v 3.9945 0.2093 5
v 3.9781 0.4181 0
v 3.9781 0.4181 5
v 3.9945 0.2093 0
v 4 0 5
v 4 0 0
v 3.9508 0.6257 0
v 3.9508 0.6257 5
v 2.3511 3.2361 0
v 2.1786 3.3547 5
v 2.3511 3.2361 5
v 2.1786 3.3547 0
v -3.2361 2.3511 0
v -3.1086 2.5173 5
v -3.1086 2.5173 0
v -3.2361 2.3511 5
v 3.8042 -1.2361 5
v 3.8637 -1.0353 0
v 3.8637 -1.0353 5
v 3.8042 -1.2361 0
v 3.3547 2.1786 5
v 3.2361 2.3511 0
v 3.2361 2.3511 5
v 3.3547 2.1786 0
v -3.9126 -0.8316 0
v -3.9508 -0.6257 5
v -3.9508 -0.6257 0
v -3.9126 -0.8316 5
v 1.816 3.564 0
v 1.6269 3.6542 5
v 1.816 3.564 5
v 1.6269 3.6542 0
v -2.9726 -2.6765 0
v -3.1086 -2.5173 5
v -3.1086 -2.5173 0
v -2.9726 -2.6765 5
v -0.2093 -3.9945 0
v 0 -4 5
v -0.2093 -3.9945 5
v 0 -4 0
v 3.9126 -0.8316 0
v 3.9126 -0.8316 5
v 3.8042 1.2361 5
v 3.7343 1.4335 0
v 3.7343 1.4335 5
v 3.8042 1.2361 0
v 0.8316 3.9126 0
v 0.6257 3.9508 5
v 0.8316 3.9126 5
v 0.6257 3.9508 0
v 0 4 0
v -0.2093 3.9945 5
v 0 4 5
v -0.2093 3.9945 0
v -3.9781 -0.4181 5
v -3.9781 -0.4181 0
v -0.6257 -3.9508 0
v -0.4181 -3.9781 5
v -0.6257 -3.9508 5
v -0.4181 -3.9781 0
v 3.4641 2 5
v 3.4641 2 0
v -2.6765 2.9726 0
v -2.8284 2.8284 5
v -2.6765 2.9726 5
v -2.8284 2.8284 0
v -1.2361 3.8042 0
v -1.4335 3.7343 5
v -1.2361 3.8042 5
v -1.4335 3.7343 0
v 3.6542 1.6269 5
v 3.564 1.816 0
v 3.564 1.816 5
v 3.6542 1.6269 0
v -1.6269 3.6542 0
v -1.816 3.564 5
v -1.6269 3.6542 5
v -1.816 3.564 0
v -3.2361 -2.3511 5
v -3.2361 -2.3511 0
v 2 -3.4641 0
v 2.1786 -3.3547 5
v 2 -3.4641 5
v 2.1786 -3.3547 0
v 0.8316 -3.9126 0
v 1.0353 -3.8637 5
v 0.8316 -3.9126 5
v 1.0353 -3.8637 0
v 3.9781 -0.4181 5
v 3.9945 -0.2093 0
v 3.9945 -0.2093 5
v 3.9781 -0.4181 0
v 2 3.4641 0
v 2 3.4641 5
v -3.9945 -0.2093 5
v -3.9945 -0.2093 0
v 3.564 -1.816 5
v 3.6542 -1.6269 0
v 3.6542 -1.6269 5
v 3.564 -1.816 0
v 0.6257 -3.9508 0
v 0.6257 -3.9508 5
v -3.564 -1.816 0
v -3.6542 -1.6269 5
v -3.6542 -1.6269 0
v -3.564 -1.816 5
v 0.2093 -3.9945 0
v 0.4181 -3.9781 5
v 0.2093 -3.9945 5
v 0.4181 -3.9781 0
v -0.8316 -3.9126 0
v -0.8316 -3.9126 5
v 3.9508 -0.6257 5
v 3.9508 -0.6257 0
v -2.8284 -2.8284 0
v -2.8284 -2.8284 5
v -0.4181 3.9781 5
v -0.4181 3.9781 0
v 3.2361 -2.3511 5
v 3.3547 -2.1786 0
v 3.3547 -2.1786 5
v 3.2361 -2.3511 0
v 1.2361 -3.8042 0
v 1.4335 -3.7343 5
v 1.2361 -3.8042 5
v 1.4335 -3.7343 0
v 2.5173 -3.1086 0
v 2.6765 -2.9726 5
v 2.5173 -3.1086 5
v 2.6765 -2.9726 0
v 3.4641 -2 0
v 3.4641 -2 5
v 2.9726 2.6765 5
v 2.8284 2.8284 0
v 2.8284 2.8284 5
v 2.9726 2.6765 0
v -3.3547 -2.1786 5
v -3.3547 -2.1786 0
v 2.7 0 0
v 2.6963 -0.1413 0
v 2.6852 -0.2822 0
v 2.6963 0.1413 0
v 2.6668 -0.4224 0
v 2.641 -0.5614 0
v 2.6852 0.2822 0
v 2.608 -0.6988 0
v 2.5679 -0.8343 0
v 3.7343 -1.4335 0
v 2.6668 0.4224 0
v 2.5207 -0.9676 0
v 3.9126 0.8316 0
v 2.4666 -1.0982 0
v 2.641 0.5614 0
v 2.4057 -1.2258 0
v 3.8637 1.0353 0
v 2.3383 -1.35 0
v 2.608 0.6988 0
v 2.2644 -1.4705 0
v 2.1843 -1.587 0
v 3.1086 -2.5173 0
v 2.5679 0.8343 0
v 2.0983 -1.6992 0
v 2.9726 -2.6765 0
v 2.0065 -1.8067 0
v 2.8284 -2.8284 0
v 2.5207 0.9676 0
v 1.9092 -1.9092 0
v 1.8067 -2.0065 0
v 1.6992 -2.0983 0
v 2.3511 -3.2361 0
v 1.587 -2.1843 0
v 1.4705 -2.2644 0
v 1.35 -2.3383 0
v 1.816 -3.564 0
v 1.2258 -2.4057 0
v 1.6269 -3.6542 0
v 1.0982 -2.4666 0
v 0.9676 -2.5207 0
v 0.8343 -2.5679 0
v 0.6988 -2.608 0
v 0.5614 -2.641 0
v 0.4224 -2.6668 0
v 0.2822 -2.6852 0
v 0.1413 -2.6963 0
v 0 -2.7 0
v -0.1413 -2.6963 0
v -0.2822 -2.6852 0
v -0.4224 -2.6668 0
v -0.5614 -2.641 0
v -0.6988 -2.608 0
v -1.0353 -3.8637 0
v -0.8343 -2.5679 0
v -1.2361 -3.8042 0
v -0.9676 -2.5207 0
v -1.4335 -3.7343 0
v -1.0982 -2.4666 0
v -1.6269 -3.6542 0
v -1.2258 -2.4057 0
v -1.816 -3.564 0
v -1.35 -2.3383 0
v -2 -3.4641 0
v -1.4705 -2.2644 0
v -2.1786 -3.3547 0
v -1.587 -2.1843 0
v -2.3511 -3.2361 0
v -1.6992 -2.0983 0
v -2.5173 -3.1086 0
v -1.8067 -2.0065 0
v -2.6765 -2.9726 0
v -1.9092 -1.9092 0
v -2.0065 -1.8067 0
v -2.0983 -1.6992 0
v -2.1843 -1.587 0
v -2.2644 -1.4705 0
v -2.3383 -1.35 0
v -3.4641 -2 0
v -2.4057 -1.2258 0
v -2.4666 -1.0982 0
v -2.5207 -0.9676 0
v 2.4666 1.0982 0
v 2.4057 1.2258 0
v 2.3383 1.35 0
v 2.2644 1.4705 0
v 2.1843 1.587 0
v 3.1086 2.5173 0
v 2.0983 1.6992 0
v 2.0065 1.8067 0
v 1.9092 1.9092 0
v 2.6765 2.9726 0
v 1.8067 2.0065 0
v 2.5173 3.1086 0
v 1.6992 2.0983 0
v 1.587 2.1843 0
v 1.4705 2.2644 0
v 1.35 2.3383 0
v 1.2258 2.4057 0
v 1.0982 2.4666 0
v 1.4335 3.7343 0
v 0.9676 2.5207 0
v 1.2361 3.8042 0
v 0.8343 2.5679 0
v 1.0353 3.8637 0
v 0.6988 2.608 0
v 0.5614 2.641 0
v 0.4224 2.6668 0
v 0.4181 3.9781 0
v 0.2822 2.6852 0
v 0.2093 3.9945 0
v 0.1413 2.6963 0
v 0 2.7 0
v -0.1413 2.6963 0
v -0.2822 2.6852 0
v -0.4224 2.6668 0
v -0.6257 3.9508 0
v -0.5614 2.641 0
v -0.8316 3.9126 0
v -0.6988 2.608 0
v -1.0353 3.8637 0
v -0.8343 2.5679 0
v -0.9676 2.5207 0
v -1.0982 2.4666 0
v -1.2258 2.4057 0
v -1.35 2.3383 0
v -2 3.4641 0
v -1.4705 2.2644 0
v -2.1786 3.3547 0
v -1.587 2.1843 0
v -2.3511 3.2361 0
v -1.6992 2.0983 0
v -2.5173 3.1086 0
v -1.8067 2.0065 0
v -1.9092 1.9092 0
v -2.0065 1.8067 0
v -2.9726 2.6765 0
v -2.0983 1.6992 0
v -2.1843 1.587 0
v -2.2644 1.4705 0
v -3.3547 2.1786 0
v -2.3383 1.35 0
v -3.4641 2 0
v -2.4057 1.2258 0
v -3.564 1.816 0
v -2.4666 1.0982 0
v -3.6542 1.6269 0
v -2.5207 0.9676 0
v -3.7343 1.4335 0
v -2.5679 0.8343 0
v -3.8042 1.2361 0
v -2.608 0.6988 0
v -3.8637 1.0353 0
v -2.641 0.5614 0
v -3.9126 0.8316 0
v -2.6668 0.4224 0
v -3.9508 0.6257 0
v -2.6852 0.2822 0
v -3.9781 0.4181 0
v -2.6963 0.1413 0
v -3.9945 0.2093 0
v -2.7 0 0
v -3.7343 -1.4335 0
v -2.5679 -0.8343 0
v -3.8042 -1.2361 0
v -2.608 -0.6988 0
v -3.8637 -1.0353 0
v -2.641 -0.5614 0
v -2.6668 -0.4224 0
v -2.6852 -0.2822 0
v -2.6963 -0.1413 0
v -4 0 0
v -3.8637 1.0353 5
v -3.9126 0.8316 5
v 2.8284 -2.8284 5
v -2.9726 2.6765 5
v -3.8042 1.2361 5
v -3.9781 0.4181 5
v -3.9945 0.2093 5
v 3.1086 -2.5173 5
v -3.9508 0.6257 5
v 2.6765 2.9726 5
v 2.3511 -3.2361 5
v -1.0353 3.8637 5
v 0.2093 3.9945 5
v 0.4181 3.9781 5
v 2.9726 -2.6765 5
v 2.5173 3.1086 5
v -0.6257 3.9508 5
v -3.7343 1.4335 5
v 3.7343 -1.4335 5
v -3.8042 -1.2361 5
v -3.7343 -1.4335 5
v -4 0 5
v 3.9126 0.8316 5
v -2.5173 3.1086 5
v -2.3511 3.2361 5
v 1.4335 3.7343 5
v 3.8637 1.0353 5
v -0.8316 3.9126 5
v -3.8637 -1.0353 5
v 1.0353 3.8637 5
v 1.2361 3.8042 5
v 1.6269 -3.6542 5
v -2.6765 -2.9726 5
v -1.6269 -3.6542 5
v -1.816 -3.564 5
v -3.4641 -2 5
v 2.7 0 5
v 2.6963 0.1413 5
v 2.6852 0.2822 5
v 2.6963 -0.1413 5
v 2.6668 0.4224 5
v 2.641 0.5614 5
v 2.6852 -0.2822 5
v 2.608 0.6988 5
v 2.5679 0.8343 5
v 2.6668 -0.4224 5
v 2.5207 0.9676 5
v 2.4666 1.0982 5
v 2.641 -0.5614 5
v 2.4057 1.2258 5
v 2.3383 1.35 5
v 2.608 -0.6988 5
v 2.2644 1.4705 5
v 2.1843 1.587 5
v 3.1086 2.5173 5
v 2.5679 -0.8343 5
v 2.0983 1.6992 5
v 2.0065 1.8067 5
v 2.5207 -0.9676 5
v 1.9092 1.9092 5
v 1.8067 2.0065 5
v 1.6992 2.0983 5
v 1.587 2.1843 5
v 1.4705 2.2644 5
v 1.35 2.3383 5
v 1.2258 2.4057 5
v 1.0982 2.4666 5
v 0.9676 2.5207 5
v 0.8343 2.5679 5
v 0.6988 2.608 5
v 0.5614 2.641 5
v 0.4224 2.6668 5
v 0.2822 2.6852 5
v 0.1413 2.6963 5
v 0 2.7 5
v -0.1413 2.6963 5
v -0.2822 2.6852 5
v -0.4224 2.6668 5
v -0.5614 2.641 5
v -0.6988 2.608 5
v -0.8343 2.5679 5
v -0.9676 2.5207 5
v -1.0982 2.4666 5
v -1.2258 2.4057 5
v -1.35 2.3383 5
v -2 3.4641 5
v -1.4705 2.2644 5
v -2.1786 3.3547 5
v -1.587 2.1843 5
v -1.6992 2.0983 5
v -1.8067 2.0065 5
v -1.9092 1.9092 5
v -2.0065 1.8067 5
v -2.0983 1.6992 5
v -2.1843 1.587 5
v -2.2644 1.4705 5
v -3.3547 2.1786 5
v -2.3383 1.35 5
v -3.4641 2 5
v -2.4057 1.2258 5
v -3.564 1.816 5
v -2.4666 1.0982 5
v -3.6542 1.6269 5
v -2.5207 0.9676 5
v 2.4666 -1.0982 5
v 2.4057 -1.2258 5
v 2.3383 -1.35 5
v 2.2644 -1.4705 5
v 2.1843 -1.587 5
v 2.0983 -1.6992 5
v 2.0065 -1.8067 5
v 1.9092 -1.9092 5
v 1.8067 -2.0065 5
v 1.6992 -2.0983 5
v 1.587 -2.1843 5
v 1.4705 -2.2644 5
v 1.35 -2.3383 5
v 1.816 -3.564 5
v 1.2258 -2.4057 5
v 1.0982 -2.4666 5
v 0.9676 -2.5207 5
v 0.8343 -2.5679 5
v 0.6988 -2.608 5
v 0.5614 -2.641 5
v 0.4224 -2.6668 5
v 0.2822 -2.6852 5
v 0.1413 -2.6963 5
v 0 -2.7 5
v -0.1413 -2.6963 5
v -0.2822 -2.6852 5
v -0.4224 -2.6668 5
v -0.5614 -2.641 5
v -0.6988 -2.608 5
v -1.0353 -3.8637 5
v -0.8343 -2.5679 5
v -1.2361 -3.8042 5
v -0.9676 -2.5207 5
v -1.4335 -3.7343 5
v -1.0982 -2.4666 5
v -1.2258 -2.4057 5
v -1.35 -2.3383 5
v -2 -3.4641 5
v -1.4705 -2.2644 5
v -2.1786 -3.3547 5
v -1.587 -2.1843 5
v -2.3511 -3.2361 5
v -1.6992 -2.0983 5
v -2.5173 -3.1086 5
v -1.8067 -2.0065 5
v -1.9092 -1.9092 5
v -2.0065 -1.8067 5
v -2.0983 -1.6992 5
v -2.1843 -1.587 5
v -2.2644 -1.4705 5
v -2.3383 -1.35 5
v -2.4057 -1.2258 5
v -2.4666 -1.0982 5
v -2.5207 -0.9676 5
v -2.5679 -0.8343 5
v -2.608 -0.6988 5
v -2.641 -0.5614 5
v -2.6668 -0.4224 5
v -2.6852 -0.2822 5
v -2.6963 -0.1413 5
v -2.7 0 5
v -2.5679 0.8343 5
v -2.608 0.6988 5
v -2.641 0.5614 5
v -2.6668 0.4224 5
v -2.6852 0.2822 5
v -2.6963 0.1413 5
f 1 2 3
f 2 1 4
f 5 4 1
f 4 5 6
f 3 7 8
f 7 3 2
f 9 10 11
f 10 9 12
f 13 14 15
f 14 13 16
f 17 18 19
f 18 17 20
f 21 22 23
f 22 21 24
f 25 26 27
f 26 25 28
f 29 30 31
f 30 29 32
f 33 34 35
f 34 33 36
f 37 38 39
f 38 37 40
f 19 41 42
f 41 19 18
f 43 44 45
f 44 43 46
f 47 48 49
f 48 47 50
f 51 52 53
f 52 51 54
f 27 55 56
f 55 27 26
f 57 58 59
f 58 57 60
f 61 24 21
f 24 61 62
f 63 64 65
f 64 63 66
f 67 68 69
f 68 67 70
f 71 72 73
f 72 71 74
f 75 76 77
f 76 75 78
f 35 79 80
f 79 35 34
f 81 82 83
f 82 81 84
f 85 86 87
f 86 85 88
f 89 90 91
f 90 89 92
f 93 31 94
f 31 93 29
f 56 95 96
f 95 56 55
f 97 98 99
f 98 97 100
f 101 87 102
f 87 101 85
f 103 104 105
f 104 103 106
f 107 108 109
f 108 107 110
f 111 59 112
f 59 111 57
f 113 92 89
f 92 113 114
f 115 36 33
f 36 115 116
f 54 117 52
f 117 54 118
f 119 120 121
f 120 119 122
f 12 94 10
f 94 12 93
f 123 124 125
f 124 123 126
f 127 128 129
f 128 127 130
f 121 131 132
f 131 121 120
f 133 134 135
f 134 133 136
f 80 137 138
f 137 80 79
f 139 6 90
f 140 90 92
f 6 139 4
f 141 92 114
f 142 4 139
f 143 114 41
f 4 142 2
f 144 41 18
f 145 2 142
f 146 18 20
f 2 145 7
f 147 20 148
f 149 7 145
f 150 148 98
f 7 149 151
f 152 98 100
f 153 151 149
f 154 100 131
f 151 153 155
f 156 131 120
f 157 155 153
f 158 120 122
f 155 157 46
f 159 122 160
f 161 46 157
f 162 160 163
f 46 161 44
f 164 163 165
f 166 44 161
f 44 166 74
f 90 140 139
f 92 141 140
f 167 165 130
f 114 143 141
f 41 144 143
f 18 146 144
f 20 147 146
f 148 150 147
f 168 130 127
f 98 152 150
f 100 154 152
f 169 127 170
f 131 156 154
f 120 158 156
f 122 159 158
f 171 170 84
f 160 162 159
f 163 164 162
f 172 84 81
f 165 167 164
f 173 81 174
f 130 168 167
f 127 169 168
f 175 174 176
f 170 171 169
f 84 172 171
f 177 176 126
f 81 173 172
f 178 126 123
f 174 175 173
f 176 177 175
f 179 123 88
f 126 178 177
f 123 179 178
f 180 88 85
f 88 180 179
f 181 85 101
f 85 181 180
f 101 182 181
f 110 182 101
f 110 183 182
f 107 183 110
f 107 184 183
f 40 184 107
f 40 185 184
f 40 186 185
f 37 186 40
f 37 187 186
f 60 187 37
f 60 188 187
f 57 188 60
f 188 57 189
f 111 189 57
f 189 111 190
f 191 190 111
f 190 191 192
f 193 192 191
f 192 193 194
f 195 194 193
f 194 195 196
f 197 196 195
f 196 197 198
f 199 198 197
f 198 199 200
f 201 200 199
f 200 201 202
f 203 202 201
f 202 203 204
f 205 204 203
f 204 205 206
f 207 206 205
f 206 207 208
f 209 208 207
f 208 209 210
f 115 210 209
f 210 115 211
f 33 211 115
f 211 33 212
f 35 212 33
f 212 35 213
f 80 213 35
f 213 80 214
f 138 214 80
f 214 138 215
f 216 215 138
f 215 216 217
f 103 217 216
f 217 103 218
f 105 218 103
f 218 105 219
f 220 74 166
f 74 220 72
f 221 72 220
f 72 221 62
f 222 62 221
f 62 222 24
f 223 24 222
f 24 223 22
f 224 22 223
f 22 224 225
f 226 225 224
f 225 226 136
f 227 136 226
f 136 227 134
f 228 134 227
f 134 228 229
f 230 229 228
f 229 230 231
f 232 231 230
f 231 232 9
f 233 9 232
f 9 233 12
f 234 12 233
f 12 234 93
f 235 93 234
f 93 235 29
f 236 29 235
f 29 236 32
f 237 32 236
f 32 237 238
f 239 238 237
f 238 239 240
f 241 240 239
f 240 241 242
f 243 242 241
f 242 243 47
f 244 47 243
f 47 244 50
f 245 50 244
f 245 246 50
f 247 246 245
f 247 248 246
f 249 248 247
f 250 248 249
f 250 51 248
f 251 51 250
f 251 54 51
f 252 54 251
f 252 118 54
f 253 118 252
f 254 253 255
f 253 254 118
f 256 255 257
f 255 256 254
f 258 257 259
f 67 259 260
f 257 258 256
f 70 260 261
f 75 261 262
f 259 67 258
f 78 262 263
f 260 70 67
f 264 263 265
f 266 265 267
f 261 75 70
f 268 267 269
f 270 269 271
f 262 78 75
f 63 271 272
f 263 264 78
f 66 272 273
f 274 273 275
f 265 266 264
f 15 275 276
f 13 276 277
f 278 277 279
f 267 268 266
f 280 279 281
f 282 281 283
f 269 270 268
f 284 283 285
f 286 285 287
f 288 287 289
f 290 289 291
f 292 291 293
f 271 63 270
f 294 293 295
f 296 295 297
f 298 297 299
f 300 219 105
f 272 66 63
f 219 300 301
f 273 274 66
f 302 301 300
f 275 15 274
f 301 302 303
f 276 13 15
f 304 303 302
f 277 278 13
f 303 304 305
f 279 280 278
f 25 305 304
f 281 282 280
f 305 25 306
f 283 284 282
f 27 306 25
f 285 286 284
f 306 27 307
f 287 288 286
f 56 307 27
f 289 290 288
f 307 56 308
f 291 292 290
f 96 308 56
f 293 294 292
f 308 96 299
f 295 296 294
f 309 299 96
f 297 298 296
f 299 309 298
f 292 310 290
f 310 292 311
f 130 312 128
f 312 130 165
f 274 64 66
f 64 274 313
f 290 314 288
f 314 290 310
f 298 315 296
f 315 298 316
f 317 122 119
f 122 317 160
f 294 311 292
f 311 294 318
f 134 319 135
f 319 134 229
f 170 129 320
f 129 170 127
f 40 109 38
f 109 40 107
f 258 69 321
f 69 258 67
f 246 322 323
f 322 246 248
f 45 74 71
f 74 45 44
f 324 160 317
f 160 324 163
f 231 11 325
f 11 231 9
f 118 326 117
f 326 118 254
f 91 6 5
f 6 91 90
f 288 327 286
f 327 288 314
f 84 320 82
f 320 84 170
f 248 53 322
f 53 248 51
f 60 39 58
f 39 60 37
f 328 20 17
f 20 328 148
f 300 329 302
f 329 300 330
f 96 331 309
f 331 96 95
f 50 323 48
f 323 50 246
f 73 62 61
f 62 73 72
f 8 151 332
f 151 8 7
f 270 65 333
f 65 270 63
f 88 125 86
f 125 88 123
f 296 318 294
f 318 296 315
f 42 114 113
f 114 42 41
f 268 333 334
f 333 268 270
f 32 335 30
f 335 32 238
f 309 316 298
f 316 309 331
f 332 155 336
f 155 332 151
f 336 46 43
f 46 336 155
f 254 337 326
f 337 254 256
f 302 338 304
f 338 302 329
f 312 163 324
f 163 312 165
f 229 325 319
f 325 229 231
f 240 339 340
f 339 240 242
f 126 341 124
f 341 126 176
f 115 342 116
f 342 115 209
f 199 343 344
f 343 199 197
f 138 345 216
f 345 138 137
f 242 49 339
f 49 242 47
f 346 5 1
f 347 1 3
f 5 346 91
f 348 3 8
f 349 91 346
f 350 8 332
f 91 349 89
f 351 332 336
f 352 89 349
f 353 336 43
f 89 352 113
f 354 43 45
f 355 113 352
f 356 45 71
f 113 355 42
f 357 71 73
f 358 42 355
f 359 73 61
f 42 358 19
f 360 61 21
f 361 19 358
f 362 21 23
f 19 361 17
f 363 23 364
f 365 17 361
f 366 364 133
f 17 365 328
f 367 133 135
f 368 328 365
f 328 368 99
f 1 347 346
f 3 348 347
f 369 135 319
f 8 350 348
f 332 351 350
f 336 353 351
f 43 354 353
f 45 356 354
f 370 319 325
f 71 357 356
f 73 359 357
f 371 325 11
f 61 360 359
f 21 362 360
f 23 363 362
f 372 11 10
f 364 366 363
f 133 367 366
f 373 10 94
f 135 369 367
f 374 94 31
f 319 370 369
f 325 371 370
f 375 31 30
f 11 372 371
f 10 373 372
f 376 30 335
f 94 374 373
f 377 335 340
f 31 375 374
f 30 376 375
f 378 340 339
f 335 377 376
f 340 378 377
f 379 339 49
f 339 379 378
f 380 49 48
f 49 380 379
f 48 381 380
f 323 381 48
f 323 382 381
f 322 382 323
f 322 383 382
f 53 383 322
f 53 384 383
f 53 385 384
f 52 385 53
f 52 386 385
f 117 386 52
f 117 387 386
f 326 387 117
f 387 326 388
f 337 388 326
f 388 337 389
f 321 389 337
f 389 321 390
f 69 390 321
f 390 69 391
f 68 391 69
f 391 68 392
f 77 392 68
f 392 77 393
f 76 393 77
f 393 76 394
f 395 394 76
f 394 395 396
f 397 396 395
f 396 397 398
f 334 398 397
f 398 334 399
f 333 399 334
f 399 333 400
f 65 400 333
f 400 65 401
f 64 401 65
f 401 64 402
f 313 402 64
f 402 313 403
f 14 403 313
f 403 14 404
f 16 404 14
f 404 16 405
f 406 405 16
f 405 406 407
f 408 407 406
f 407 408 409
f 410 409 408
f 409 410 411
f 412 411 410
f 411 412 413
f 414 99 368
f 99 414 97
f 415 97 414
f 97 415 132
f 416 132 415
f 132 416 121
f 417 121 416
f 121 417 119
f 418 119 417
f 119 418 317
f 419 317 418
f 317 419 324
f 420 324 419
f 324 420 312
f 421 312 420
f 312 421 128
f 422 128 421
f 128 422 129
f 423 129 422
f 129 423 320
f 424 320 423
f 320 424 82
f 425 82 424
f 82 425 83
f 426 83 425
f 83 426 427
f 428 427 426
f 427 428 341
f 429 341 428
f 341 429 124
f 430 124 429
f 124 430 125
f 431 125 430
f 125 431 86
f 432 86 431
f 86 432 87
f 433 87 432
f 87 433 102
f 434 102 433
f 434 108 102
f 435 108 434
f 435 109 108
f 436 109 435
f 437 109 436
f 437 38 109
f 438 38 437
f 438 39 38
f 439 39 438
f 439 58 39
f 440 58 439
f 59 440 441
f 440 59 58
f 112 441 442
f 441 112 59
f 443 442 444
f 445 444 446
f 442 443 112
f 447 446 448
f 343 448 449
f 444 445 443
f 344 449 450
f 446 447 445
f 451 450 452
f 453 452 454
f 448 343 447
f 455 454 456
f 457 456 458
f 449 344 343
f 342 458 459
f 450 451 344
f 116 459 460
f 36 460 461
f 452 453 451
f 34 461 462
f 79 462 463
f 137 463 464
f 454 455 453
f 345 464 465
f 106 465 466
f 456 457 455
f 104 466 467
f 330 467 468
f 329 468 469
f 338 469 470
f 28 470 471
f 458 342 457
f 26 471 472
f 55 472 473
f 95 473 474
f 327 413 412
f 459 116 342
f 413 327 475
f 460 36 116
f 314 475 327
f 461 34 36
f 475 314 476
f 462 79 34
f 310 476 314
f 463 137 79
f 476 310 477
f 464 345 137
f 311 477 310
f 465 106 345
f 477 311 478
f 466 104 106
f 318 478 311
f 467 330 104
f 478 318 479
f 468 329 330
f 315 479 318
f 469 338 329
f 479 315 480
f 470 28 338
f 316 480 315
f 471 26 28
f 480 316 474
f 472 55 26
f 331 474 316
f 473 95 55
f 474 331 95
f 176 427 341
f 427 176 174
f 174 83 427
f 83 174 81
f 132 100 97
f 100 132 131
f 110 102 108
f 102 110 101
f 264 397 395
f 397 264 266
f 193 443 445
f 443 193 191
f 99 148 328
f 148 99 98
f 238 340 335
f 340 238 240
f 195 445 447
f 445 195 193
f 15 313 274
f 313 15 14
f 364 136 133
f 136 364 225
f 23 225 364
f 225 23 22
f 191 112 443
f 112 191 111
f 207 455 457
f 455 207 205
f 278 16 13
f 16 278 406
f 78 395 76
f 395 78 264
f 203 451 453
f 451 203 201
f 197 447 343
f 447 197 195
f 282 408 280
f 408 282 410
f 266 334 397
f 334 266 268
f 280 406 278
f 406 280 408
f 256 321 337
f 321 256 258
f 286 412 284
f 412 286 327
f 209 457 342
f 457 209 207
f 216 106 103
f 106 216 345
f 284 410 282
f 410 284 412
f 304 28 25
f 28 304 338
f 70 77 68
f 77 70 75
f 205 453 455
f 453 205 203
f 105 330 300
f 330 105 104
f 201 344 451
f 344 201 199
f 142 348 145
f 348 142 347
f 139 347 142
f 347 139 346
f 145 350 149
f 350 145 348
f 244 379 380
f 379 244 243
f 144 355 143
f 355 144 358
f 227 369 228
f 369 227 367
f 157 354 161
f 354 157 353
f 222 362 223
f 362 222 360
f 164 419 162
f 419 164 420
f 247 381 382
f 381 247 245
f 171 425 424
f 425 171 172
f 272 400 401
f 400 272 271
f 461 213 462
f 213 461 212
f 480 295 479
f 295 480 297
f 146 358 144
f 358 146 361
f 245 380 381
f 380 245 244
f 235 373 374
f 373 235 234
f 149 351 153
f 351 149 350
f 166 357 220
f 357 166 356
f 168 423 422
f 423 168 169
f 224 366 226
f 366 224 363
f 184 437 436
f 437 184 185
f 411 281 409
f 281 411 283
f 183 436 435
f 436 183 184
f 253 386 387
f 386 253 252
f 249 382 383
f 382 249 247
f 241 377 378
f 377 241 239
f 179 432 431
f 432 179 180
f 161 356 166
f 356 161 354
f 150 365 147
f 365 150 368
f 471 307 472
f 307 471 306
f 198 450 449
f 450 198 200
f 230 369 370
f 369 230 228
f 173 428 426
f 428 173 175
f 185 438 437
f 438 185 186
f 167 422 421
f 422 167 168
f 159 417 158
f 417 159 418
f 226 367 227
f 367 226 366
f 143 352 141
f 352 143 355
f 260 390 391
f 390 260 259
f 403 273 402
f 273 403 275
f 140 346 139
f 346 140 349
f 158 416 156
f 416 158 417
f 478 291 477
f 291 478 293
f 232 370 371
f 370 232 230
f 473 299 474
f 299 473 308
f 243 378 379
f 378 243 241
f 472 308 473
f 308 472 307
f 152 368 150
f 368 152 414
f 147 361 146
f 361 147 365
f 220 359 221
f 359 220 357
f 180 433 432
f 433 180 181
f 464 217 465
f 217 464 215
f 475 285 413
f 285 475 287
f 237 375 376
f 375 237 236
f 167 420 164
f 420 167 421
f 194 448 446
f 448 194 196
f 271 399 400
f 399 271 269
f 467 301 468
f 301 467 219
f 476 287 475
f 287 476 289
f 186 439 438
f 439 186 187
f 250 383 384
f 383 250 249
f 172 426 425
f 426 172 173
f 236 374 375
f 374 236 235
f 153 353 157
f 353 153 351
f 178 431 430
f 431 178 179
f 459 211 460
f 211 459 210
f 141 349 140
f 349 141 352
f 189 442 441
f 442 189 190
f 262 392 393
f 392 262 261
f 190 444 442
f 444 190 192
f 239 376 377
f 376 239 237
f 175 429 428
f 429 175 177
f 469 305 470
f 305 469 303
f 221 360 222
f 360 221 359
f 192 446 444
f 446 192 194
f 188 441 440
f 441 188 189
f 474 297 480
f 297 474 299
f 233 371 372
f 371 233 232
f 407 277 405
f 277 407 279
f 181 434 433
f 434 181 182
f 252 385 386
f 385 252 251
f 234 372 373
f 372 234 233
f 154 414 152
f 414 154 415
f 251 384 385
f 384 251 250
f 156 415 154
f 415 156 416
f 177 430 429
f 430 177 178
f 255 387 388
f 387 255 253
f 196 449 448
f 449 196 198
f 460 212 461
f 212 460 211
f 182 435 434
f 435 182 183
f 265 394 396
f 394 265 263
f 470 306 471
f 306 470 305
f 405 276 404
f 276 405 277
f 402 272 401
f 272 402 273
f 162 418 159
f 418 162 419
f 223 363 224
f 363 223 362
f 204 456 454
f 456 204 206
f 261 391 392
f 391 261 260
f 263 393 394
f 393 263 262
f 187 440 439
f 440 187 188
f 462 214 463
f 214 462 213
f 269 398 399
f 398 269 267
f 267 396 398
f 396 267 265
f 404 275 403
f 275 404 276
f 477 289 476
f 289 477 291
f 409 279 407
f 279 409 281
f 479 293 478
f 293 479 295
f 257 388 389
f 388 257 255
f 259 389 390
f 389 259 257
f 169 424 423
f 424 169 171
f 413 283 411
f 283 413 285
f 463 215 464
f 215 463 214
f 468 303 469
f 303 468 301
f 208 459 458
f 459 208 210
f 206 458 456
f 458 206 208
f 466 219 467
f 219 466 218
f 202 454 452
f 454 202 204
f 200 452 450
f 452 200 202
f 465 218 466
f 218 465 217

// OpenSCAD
$fn = 120;

dist = 39.3;
d = 5.2;
offset = 0.4;
dist_all = dist + d + offset;

module stick(x)
{
    cylinder(h = x, r = d/2, center = false);
}

/*for(i = [1 : 1 : 5])
{
    translate([(i-1) * dist_all, 0, 0])
    {
        stick(7*i);
    }
}*/


module main()
{
    translate([0, -2.5, 0])
    {
        cube([180, 5, 2]);
    }
    for(i = [1 : 1 : 5])
    {
    translate([(i-1) * dist_all, 0, 0])
        {
            stick(7*i);
        }
    }
}

offset_cyl = 0.1;

module cyl()
{
    difference(){
        cylinder(h = 5, r = 4, center = false);
        cylinder(h = 50, r = (d/2) + offset_cyl, center = true);
    }
}

cyl();

/*$fn = 60;

h_draw_stick = 15;
r_draw_stick = 3.1;
r_base = 50;
shift = 5; 
h_grip = 50;
stick_r = 1.5;
a = r_base-shift;

module base(){  
cylinder(h = 5, r = r_base, center = true);
translate([r_base-shift, 0, -h_grip/2]){
    cylinder(h = 50, r = r_draw_stick, center = true);
    }
}


module draw_stick(){
    cylinder(h = 15, r = r_draw_stick, center = true);
    difference(){
        translate([-0.8, -3, (h_draw_stick/2)-2]){
            stick_holder();
        }
    }
}


module main(){
    base();
    for(i = [0 : 22.5 : 360]){
    translate([a * cos(i), a * sin(i), h_draw_stick/2]){
        rotate([0, 0, i]){
            draw_stick();
            }
        }
    
    }
}

module stick_holder(){
    a = 12;
    b = 6;
    c = 2;
    difference(){
        cube([a, b, c]);
        translate([a-stick_r, (b/2)-stick_r, -1]) cube([stick_r, stick_r, c+5]);
        }    
}

main();
*/
